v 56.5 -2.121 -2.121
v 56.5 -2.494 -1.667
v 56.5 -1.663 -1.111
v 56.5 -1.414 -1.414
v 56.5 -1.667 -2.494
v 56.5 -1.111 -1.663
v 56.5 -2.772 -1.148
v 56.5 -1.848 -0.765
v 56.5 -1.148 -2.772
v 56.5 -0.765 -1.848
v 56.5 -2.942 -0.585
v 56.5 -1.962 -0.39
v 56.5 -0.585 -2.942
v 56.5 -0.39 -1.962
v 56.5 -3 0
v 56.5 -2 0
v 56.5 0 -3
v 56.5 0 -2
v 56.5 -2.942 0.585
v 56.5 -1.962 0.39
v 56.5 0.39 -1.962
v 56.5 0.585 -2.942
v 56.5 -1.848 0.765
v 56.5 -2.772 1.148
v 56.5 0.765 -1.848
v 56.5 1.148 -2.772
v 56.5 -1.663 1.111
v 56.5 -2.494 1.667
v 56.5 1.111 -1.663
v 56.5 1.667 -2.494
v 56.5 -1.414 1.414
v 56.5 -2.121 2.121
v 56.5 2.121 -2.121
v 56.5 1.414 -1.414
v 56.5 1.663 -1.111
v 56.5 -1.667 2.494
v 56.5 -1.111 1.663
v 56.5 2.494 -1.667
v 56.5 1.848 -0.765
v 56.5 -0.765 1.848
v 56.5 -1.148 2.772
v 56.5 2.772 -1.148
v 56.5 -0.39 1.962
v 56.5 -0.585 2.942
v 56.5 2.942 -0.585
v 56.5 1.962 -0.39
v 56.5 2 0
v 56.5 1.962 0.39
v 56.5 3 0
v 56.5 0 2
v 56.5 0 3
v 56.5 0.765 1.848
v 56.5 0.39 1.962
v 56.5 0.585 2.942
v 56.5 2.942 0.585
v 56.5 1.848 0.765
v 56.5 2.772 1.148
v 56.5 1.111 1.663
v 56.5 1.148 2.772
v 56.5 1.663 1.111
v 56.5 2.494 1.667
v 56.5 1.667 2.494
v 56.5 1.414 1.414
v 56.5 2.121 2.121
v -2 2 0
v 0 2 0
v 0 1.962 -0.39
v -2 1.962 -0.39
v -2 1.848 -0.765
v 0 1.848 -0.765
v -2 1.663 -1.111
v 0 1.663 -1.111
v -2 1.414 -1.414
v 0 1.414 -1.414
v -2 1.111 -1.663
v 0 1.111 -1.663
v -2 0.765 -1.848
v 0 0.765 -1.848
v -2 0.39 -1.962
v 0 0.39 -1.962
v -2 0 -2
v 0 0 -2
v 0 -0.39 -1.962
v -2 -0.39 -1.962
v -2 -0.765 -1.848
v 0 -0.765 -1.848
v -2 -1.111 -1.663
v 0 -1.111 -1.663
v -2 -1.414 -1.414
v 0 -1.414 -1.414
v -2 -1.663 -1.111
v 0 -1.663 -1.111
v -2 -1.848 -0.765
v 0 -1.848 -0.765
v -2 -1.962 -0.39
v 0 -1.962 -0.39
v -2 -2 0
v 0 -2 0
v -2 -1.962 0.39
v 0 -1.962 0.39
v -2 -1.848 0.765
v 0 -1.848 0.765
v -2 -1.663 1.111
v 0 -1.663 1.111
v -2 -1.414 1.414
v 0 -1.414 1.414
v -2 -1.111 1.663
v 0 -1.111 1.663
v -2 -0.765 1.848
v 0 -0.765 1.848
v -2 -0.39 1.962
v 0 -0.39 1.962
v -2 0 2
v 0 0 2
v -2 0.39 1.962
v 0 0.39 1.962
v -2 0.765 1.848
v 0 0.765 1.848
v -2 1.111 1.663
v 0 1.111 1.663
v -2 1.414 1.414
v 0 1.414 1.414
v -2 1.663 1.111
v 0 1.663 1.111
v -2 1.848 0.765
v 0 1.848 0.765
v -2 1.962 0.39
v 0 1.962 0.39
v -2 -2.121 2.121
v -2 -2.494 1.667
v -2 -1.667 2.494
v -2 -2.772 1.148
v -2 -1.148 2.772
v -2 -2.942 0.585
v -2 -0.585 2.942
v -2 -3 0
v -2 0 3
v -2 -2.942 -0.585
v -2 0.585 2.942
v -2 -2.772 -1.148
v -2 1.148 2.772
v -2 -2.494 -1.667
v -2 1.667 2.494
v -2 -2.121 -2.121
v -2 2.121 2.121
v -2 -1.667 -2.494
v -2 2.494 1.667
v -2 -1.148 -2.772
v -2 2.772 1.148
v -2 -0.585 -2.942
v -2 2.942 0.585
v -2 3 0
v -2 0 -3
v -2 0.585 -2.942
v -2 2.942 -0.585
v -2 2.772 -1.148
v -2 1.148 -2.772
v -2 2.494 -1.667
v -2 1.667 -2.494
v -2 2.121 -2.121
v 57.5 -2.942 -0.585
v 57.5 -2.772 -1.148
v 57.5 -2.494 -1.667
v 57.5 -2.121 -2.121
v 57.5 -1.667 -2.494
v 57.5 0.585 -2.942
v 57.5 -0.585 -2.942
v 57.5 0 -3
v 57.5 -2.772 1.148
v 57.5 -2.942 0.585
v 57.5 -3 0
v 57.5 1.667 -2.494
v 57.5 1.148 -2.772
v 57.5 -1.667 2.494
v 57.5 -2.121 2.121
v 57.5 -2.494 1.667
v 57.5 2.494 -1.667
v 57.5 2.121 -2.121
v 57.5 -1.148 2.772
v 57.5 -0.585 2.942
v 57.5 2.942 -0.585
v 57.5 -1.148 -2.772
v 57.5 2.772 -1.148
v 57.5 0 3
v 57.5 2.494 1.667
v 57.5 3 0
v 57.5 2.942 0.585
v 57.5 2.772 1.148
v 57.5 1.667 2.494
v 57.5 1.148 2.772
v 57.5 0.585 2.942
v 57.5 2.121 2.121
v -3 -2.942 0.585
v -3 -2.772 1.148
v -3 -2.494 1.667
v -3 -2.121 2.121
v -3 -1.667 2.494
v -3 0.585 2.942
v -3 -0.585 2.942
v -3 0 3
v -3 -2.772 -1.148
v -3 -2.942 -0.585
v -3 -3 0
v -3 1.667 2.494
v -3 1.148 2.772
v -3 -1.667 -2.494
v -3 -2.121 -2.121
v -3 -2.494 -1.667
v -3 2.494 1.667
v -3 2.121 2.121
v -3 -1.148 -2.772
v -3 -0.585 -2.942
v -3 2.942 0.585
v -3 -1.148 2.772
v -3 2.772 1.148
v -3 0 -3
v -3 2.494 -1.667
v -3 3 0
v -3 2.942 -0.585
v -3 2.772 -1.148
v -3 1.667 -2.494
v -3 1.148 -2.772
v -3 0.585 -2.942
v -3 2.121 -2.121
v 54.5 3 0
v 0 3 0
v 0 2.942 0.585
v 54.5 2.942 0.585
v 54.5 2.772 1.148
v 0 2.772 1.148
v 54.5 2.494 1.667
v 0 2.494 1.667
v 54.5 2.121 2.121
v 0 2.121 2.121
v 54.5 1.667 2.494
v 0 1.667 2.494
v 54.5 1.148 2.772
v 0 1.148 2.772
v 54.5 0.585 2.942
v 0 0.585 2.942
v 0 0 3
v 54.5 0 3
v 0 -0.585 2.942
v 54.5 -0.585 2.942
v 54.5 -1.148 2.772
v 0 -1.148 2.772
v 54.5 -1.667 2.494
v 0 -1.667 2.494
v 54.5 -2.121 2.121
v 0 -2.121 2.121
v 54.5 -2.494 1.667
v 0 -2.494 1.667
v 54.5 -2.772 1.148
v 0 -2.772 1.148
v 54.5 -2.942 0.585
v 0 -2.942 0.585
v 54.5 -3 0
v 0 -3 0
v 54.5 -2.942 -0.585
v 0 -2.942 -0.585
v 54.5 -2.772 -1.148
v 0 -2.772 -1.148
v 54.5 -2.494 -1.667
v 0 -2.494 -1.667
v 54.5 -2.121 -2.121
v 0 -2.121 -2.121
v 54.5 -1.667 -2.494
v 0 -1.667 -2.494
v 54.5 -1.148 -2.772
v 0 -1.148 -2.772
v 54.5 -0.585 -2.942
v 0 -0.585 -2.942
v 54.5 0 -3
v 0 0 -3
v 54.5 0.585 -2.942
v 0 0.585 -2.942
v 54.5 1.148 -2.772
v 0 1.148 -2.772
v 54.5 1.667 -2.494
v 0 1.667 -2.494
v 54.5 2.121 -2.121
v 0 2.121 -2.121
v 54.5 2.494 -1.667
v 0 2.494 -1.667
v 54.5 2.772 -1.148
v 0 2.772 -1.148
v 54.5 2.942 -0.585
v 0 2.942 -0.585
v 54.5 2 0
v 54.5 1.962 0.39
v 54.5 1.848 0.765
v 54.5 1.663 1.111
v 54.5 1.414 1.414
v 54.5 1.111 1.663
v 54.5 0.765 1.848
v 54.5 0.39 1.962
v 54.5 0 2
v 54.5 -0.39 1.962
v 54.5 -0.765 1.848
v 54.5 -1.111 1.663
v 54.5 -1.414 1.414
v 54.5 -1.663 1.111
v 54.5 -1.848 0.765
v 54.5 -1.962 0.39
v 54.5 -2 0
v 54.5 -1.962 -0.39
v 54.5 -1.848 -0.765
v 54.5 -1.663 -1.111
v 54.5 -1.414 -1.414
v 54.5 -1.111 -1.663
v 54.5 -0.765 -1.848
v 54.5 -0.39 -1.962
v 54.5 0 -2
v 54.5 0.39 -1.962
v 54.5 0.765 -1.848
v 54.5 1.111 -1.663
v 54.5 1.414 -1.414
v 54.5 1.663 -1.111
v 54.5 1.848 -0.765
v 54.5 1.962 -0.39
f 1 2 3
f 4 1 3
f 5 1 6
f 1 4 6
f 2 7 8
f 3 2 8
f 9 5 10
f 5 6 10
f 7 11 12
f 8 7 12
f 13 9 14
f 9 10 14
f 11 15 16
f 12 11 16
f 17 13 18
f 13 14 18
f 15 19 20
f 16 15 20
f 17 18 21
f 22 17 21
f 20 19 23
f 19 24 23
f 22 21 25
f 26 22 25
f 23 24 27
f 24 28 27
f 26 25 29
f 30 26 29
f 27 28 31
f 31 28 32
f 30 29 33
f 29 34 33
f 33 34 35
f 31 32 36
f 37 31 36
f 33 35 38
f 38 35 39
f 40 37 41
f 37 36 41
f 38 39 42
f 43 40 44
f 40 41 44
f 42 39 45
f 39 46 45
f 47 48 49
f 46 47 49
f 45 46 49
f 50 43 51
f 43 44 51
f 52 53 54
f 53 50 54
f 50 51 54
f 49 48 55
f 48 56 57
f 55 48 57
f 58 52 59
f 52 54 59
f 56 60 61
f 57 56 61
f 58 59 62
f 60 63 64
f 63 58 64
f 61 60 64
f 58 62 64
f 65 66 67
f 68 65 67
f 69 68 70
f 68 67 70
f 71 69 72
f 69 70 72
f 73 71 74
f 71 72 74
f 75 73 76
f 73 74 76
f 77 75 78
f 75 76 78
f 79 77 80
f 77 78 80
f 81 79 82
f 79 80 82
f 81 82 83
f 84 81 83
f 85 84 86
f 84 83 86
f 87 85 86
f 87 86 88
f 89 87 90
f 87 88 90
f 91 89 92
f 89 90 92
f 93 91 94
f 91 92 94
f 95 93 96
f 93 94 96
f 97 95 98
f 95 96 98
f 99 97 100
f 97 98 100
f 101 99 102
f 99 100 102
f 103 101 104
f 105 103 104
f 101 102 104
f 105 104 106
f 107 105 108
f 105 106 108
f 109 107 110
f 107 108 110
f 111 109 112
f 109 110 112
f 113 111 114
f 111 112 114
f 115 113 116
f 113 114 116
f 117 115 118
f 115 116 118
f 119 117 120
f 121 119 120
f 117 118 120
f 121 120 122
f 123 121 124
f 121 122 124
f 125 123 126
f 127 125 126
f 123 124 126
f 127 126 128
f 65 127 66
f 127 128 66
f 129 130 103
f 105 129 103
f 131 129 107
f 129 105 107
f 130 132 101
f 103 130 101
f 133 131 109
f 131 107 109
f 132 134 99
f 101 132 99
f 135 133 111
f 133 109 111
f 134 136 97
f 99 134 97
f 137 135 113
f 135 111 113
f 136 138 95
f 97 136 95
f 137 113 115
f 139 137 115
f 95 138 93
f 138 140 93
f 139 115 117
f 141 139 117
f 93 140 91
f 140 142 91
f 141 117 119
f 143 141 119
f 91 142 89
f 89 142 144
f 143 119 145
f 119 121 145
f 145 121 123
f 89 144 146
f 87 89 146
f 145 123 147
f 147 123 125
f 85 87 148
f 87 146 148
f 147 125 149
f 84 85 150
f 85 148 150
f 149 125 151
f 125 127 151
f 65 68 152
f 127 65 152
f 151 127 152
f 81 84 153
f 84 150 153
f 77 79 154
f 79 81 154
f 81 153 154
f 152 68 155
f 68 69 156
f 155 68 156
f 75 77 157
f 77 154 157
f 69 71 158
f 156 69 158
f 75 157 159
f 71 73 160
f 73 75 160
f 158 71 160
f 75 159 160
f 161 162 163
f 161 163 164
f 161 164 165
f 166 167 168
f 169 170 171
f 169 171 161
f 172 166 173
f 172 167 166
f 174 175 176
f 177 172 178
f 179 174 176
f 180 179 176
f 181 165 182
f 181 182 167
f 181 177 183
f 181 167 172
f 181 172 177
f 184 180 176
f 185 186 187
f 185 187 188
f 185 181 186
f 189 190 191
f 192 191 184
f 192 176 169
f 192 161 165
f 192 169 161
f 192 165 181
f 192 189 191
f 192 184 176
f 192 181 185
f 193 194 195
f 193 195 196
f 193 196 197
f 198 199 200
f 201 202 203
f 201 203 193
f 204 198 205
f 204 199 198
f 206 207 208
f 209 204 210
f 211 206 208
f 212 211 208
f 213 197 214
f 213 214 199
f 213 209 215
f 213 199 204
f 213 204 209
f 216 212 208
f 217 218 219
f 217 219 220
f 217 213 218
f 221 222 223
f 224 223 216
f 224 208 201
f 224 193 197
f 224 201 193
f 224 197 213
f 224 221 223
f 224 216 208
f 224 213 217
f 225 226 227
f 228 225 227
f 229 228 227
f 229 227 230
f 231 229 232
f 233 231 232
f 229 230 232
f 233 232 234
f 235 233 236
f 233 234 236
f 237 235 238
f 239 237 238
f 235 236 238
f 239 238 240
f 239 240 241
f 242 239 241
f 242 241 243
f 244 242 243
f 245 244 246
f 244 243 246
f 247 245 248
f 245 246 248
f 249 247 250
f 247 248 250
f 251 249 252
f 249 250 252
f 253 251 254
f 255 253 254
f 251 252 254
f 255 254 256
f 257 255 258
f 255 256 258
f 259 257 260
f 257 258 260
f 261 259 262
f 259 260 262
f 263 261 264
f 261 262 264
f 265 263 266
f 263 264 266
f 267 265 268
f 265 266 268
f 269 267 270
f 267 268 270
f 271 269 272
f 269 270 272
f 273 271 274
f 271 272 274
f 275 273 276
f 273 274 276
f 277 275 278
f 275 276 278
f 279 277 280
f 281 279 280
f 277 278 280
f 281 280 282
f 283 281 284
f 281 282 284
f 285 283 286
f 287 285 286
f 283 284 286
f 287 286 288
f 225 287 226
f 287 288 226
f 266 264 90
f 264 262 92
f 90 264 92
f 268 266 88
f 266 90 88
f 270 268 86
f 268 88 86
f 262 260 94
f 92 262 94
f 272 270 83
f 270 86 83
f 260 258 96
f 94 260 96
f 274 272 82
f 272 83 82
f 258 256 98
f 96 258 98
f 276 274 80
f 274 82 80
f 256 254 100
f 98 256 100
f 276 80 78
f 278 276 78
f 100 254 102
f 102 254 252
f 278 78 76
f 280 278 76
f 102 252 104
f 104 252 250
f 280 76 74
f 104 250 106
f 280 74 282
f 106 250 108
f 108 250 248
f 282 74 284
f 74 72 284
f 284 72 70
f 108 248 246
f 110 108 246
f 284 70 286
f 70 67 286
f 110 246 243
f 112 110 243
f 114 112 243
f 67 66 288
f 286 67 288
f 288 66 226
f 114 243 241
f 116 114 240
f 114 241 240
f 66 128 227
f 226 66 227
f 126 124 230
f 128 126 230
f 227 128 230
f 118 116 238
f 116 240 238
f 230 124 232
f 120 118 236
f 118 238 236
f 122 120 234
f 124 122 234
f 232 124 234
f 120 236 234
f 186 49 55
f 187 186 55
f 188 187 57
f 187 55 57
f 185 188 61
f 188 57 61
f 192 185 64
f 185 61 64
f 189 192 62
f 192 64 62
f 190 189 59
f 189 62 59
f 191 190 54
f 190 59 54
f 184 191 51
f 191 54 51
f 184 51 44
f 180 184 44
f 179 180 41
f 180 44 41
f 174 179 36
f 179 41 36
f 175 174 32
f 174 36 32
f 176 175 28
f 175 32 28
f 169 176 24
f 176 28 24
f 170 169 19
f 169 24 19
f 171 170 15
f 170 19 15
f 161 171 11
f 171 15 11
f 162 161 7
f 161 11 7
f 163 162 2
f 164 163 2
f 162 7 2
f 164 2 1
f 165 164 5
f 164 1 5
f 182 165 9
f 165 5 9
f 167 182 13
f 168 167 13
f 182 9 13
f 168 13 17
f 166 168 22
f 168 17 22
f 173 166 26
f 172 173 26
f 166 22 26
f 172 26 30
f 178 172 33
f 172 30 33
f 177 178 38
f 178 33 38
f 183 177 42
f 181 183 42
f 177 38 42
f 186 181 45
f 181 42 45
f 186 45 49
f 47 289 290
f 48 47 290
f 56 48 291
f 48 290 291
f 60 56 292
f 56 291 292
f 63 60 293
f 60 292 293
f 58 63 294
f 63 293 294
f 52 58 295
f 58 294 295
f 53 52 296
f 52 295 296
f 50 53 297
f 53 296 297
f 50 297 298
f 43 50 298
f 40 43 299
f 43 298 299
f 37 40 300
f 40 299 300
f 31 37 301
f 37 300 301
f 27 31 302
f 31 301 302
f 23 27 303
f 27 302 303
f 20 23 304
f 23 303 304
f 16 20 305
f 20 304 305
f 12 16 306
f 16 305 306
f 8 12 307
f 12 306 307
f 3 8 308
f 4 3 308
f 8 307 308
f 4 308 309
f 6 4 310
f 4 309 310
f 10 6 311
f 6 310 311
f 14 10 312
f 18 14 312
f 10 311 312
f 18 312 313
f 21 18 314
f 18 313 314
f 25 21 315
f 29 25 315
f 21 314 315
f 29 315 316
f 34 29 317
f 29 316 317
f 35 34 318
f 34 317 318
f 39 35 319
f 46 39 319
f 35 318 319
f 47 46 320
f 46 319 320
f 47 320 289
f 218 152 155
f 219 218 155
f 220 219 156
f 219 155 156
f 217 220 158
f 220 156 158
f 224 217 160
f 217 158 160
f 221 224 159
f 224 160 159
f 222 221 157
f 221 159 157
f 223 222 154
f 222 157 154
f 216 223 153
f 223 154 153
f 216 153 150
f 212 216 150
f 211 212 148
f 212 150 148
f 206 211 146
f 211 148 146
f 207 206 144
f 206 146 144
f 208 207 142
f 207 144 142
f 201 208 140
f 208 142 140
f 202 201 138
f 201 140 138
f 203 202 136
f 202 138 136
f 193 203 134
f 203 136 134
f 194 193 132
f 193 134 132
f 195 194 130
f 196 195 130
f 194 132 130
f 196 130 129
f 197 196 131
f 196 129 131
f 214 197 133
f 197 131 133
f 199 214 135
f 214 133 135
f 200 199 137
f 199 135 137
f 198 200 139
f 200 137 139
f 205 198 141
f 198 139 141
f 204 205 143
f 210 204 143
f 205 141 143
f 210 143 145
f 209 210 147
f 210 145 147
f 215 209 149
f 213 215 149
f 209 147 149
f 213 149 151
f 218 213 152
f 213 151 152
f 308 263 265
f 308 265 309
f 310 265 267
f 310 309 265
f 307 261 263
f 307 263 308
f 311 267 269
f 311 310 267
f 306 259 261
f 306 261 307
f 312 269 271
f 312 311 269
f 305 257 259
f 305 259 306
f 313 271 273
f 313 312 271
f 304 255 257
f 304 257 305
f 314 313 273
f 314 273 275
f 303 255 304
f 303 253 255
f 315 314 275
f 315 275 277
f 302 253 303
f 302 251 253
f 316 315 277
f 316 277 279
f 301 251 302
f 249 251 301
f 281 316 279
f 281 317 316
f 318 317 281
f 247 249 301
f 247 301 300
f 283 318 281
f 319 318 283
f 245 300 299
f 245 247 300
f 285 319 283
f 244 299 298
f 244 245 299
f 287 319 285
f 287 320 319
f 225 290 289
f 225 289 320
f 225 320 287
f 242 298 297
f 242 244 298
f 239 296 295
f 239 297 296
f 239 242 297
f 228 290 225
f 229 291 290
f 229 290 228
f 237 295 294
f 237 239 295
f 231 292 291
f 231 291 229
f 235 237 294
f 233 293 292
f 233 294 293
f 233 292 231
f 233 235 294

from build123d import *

# Parameters (mm, degrees)
SKETCH_R     = 3
PAD_DEPTH    = 54.5
SKETCH001_R  = 2
PAD001_DEPTH = 2
SKETCH002_R  = 3
PAD002_DEPTH = 1
SKETCH003_R  = 2
PAD003_DEPTH = 2
SKETCH004_R  = 3
PAD004_DEPTH = 1


with BuildPart() as part:
    # Sketch → Pad (new body)
    with BuildSketch(Plane.YZ):
        Circle(SKETCH_R)
    extrude(amount=PAD_DEPTH)

    # Sketch001 (on Face3 of Pad) → Pad001 (join)
    with BuildSketch(Plane.YZ.offset(54.5)):
        Circle(SKETCH001_R)
    extrude(amount=PAD001_DEPTH)

    # Sketch002 (on Face5 of Pad001) → Pad002 (join)
    with BuildSketch(Plane.YZ.offset(56.5)):
        Circle(SKETCH002_R)
    extrude(amount=PAD002_DEPTH)

    # Sketch003 (on Face7 of Pad002) → Pad003 (join)
    with BuildSketch(Plane(origin=(0, 0, 0), x_dir=(0, 1, 0), z_dir=(-1, 0, 0))):
        Circle(SKETCH003_R)
    extrude(amount=PAD003_DEPTH)

    # Sketch004 (on Face9 of Pad003) → Pad004 (join)
    with BuildSketch(Plane(origin=(-2, 0, 0), x_dir=(0, 1, 0), z_dir=(-1, 0, 0))):
        Circle(SKETCH004_R)
    extrude(amount=PAD004_DEPTH)


solid = part.part
